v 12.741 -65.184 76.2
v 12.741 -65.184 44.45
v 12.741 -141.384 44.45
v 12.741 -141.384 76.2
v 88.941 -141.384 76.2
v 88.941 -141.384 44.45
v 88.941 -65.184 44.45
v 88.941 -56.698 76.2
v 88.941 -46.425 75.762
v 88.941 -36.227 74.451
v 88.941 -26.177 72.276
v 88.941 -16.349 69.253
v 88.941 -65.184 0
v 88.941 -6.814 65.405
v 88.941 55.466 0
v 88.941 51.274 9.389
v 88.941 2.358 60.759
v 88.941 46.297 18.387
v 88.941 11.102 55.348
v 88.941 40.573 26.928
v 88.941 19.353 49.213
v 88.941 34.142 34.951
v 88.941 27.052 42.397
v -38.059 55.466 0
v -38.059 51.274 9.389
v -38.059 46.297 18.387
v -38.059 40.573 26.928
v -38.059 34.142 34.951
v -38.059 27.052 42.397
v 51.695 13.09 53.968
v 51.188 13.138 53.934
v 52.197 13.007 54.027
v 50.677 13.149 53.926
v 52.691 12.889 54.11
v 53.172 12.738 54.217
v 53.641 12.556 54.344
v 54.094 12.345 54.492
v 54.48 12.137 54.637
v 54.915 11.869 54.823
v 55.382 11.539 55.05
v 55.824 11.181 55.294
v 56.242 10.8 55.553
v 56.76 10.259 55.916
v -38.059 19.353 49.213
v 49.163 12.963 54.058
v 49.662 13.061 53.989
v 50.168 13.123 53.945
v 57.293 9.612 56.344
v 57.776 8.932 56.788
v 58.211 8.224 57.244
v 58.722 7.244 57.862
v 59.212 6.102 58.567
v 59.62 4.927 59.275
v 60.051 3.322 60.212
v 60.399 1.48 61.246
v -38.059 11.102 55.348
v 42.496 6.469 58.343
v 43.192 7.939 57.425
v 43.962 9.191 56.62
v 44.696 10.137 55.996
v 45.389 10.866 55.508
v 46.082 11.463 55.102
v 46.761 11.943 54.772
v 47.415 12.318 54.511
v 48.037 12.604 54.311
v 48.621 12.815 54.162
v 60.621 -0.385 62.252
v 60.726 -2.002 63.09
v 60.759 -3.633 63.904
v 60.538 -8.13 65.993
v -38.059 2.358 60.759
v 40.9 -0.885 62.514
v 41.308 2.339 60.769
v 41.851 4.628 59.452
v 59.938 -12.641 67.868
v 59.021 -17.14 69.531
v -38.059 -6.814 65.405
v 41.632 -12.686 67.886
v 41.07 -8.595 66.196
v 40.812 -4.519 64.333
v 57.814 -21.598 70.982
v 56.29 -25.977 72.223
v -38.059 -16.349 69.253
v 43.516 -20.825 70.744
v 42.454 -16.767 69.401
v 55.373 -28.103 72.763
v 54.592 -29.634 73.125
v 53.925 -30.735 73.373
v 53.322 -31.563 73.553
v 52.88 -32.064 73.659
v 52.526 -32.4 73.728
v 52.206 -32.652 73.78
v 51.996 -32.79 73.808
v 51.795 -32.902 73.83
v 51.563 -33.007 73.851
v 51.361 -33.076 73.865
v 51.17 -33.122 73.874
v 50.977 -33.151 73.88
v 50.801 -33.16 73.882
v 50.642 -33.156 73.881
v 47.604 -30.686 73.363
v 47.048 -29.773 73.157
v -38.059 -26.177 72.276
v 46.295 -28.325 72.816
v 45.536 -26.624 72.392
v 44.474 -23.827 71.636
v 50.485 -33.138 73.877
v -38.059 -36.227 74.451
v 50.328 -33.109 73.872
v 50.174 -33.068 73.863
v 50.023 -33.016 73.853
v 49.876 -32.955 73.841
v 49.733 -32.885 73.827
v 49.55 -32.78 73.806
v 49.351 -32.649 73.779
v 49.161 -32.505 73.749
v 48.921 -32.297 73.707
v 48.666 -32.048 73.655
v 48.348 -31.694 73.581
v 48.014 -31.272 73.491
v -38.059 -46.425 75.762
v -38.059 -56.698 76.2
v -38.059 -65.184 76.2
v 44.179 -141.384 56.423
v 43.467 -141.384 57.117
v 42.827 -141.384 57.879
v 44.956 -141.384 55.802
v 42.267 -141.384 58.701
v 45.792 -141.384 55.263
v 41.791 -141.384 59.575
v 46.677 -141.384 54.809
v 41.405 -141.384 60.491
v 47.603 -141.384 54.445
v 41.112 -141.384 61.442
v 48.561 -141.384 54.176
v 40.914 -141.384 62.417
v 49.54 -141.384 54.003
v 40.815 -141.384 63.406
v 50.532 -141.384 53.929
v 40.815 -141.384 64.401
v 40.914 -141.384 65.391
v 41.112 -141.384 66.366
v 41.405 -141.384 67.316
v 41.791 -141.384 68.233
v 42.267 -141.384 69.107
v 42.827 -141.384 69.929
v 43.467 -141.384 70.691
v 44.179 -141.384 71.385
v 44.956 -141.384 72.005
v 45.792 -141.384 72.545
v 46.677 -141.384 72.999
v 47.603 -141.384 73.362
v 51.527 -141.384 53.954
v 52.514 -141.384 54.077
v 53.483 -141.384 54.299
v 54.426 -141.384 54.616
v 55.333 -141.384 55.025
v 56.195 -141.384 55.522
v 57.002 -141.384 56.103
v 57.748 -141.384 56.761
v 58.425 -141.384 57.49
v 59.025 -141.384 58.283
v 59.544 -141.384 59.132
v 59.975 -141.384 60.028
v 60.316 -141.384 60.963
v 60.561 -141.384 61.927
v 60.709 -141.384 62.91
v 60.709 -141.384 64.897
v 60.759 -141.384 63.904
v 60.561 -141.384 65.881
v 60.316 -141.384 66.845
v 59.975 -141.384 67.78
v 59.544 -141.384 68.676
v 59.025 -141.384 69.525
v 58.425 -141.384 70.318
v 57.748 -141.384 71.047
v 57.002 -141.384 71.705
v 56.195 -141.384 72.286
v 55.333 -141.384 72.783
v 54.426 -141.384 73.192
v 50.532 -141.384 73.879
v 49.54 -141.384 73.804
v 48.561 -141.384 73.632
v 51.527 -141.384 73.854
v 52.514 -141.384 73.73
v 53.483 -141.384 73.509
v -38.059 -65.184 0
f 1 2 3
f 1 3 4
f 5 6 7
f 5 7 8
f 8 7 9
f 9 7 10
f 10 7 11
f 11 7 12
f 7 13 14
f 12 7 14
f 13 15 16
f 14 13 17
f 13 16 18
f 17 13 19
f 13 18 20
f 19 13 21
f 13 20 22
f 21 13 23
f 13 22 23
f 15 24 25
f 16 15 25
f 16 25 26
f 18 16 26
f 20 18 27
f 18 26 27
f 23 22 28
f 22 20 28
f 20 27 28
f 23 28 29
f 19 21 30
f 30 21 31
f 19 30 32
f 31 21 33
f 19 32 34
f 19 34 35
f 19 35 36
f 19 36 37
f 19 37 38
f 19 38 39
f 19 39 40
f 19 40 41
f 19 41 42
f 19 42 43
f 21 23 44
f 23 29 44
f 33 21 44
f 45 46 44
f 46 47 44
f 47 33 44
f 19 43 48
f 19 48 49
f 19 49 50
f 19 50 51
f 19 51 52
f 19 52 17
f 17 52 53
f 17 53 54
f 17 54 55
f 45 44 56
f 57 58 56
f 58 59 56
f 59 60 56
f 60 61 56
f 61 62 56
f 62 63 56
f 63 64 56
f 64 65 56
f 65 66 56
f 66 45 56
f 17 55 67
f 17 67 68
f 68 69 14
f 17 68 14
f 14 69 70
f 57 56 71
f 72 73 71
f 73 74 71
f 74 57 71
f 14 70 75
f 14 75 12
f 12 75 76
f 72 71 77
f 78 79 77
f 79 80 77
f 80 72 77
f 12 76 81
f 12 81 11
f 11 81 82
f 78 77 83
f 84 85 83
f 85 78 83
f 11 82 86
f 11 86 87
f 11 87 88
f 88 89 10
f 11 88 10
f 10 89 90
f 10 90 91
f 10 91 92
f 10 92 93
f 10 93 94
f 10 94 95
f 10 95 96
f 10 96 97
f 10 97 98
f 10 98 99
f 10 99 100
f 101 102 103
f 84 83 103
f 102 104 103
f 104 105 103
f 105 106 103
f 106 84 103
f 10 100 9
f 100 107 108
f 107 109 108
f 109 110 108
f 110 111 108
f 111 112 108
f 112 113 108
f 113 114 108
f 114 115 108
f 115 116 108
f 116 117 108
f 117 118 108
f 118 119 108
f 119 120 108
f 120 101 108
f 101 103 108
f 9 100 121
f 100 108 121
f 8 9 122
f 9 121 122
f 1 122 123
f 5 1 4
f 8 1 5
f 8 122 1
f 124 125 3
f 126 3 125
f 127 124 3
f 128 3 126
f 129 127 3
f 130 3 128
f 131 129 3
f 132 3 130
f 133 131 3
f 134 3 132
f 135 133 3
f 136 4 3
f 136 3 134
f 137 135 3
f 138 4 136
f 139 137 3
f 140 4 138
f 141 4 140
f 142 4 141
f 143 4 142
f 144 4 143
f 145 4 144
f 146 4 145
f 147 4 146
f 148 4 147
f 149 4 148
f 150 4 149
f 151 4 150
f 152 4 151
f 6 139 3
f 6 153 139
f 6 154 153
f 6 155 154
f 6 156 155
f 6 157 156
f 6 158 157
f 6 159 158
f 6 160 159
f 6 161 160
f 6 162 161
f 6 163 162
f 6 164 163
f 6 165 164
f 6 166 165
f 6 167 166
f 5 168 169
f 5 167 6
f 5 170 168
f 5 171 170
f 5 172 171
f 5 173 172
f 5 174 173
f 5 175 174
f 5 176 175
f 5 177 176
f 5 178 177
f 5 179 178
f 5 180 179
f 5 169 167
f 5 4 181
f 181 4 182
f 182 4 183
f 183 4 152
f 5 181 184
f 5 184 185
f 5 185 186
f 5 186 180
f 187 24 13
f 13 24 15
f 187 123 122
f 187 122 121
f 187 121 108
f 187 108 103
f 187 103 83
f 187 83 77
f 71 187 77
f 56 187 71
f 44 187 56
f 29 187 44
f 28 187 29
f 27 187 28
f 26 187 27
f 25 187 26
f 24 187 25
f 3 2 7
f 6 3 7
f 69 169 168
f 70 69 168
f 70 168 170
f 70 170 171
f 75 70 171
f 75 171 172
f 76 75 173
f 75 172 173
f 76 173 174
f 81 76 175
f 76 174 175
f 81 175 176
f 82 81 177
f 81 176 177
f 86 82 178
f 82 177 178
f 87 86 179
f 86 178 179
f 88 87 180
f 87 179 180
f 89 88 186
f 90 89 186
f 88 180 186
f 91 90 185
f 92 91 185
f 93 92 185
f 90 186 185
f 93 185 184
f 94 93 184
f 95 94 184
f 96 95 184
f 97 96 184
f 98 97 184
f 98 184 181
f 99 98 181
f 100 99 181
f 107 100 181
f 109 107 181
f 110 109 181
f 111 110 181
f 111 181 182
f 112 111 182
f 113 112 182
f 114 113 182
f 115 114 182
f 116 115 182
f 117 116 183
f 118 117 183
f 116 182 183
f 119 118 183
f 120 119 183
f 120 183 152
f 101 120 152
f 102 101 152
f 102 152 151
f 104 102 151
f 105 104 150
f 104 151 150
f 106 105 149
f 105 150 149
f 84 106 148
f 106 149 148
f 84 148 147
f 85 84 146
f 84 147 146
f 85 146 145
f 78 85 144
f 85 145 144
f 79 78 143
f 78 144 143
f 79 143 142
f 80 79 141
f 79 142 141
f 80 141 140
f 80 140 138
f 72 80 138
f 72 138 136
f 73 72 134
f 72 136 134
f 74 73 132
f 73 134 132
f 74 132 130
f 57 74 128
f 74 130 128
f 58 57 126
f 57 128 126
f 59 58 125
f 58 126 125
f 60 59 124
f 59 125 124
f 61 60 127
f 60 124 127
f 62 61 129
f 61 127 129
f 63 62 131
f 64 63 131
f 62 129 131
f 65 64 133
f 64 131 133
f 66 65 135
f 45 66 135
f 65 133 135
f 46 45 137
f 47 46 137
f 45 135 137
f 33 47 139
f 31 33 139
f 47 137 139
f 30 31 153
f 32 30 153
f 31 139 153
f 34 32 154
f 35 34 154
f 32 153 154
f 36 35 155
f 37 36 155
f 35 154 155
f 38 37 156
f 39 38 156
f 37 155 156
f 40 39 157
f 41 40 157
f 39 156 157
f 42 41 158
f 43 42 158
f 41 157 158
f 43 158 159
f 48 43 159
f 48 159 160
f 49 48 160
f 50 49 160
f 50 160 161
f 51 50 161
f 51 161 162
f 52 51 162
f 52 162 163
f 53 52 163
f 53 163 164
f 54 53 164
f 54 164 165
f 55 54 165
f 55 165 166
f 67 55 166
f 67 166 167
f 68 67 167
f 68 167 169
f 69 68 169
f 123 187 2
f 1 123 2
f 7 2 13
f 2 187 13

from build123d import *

# Parameters (mm, degrees)
F0_W        = 127
F0_H        = 120.65
F1_DEPTH    = 76.2
F2_T1_DEPTH = 687.8168150118
F3_W        = 76.2
F3_H        = 31.75
F4_DEPTH    = 76.2
F5_R        = 9.9779768357
F6_DEPTH    = 215.9


# Not quite as in the source:
# - a fillet or chamfer that OpenCascade refuses, or shapes differently, is made with other operations: its cross-section is extruded or revolved along the edge and cut away or added


with BuildPart() as f1:
    # F0 (on Top) → F1 (new body)
    with BuildSketch(Plane.XY):
        with Locations((25.4407467544, -4.8593845844)):
            Rectangle(F0_W, F0_H)
    extrude(amount=F1_DEPTH)

    # F2: fillet of radius 120.65 on 1 edges, made by hand

    # F2_s2 → F2_t1 (cut)
    with BuildSketch(Plane.YZ.offset(-318.4676607515)):
        with BuildLine():
            ThreePointArc((55.4656154156, 0), (11.1016993136, 55.3480836489), (-56.6977475868, 76.2))
            Line((-56.6977475868, 76.2), (55.4656154156, 76.2))
            Line((55.4656154156, 76.2), (55.4656154156, 0))
        make_face()
    extrude(amount=F2_T1_DEPTH, mode=Mode.SUBTRACT)

    # F3 (on face) → F4 (join)
    with BuildSketch(Plane.XZ.offset(65.1843845844)):
        with Locations((50.8407467544, 60.325)):
            Rectangle(F3_W, F3_H)
    extrude(amount=F4_DEPTH)

    # F5 (on face) → F6 (cut)
    with BuildSketch(Plane.XZ.offset(141.3843845844)):
        with Locations((50.7810004056, 63.9038160443)):
            Circle(F5_R)
    extrude(amount=-F6_DEPTH, mode=Mode.SUBTRACT)


solid = f1.part
